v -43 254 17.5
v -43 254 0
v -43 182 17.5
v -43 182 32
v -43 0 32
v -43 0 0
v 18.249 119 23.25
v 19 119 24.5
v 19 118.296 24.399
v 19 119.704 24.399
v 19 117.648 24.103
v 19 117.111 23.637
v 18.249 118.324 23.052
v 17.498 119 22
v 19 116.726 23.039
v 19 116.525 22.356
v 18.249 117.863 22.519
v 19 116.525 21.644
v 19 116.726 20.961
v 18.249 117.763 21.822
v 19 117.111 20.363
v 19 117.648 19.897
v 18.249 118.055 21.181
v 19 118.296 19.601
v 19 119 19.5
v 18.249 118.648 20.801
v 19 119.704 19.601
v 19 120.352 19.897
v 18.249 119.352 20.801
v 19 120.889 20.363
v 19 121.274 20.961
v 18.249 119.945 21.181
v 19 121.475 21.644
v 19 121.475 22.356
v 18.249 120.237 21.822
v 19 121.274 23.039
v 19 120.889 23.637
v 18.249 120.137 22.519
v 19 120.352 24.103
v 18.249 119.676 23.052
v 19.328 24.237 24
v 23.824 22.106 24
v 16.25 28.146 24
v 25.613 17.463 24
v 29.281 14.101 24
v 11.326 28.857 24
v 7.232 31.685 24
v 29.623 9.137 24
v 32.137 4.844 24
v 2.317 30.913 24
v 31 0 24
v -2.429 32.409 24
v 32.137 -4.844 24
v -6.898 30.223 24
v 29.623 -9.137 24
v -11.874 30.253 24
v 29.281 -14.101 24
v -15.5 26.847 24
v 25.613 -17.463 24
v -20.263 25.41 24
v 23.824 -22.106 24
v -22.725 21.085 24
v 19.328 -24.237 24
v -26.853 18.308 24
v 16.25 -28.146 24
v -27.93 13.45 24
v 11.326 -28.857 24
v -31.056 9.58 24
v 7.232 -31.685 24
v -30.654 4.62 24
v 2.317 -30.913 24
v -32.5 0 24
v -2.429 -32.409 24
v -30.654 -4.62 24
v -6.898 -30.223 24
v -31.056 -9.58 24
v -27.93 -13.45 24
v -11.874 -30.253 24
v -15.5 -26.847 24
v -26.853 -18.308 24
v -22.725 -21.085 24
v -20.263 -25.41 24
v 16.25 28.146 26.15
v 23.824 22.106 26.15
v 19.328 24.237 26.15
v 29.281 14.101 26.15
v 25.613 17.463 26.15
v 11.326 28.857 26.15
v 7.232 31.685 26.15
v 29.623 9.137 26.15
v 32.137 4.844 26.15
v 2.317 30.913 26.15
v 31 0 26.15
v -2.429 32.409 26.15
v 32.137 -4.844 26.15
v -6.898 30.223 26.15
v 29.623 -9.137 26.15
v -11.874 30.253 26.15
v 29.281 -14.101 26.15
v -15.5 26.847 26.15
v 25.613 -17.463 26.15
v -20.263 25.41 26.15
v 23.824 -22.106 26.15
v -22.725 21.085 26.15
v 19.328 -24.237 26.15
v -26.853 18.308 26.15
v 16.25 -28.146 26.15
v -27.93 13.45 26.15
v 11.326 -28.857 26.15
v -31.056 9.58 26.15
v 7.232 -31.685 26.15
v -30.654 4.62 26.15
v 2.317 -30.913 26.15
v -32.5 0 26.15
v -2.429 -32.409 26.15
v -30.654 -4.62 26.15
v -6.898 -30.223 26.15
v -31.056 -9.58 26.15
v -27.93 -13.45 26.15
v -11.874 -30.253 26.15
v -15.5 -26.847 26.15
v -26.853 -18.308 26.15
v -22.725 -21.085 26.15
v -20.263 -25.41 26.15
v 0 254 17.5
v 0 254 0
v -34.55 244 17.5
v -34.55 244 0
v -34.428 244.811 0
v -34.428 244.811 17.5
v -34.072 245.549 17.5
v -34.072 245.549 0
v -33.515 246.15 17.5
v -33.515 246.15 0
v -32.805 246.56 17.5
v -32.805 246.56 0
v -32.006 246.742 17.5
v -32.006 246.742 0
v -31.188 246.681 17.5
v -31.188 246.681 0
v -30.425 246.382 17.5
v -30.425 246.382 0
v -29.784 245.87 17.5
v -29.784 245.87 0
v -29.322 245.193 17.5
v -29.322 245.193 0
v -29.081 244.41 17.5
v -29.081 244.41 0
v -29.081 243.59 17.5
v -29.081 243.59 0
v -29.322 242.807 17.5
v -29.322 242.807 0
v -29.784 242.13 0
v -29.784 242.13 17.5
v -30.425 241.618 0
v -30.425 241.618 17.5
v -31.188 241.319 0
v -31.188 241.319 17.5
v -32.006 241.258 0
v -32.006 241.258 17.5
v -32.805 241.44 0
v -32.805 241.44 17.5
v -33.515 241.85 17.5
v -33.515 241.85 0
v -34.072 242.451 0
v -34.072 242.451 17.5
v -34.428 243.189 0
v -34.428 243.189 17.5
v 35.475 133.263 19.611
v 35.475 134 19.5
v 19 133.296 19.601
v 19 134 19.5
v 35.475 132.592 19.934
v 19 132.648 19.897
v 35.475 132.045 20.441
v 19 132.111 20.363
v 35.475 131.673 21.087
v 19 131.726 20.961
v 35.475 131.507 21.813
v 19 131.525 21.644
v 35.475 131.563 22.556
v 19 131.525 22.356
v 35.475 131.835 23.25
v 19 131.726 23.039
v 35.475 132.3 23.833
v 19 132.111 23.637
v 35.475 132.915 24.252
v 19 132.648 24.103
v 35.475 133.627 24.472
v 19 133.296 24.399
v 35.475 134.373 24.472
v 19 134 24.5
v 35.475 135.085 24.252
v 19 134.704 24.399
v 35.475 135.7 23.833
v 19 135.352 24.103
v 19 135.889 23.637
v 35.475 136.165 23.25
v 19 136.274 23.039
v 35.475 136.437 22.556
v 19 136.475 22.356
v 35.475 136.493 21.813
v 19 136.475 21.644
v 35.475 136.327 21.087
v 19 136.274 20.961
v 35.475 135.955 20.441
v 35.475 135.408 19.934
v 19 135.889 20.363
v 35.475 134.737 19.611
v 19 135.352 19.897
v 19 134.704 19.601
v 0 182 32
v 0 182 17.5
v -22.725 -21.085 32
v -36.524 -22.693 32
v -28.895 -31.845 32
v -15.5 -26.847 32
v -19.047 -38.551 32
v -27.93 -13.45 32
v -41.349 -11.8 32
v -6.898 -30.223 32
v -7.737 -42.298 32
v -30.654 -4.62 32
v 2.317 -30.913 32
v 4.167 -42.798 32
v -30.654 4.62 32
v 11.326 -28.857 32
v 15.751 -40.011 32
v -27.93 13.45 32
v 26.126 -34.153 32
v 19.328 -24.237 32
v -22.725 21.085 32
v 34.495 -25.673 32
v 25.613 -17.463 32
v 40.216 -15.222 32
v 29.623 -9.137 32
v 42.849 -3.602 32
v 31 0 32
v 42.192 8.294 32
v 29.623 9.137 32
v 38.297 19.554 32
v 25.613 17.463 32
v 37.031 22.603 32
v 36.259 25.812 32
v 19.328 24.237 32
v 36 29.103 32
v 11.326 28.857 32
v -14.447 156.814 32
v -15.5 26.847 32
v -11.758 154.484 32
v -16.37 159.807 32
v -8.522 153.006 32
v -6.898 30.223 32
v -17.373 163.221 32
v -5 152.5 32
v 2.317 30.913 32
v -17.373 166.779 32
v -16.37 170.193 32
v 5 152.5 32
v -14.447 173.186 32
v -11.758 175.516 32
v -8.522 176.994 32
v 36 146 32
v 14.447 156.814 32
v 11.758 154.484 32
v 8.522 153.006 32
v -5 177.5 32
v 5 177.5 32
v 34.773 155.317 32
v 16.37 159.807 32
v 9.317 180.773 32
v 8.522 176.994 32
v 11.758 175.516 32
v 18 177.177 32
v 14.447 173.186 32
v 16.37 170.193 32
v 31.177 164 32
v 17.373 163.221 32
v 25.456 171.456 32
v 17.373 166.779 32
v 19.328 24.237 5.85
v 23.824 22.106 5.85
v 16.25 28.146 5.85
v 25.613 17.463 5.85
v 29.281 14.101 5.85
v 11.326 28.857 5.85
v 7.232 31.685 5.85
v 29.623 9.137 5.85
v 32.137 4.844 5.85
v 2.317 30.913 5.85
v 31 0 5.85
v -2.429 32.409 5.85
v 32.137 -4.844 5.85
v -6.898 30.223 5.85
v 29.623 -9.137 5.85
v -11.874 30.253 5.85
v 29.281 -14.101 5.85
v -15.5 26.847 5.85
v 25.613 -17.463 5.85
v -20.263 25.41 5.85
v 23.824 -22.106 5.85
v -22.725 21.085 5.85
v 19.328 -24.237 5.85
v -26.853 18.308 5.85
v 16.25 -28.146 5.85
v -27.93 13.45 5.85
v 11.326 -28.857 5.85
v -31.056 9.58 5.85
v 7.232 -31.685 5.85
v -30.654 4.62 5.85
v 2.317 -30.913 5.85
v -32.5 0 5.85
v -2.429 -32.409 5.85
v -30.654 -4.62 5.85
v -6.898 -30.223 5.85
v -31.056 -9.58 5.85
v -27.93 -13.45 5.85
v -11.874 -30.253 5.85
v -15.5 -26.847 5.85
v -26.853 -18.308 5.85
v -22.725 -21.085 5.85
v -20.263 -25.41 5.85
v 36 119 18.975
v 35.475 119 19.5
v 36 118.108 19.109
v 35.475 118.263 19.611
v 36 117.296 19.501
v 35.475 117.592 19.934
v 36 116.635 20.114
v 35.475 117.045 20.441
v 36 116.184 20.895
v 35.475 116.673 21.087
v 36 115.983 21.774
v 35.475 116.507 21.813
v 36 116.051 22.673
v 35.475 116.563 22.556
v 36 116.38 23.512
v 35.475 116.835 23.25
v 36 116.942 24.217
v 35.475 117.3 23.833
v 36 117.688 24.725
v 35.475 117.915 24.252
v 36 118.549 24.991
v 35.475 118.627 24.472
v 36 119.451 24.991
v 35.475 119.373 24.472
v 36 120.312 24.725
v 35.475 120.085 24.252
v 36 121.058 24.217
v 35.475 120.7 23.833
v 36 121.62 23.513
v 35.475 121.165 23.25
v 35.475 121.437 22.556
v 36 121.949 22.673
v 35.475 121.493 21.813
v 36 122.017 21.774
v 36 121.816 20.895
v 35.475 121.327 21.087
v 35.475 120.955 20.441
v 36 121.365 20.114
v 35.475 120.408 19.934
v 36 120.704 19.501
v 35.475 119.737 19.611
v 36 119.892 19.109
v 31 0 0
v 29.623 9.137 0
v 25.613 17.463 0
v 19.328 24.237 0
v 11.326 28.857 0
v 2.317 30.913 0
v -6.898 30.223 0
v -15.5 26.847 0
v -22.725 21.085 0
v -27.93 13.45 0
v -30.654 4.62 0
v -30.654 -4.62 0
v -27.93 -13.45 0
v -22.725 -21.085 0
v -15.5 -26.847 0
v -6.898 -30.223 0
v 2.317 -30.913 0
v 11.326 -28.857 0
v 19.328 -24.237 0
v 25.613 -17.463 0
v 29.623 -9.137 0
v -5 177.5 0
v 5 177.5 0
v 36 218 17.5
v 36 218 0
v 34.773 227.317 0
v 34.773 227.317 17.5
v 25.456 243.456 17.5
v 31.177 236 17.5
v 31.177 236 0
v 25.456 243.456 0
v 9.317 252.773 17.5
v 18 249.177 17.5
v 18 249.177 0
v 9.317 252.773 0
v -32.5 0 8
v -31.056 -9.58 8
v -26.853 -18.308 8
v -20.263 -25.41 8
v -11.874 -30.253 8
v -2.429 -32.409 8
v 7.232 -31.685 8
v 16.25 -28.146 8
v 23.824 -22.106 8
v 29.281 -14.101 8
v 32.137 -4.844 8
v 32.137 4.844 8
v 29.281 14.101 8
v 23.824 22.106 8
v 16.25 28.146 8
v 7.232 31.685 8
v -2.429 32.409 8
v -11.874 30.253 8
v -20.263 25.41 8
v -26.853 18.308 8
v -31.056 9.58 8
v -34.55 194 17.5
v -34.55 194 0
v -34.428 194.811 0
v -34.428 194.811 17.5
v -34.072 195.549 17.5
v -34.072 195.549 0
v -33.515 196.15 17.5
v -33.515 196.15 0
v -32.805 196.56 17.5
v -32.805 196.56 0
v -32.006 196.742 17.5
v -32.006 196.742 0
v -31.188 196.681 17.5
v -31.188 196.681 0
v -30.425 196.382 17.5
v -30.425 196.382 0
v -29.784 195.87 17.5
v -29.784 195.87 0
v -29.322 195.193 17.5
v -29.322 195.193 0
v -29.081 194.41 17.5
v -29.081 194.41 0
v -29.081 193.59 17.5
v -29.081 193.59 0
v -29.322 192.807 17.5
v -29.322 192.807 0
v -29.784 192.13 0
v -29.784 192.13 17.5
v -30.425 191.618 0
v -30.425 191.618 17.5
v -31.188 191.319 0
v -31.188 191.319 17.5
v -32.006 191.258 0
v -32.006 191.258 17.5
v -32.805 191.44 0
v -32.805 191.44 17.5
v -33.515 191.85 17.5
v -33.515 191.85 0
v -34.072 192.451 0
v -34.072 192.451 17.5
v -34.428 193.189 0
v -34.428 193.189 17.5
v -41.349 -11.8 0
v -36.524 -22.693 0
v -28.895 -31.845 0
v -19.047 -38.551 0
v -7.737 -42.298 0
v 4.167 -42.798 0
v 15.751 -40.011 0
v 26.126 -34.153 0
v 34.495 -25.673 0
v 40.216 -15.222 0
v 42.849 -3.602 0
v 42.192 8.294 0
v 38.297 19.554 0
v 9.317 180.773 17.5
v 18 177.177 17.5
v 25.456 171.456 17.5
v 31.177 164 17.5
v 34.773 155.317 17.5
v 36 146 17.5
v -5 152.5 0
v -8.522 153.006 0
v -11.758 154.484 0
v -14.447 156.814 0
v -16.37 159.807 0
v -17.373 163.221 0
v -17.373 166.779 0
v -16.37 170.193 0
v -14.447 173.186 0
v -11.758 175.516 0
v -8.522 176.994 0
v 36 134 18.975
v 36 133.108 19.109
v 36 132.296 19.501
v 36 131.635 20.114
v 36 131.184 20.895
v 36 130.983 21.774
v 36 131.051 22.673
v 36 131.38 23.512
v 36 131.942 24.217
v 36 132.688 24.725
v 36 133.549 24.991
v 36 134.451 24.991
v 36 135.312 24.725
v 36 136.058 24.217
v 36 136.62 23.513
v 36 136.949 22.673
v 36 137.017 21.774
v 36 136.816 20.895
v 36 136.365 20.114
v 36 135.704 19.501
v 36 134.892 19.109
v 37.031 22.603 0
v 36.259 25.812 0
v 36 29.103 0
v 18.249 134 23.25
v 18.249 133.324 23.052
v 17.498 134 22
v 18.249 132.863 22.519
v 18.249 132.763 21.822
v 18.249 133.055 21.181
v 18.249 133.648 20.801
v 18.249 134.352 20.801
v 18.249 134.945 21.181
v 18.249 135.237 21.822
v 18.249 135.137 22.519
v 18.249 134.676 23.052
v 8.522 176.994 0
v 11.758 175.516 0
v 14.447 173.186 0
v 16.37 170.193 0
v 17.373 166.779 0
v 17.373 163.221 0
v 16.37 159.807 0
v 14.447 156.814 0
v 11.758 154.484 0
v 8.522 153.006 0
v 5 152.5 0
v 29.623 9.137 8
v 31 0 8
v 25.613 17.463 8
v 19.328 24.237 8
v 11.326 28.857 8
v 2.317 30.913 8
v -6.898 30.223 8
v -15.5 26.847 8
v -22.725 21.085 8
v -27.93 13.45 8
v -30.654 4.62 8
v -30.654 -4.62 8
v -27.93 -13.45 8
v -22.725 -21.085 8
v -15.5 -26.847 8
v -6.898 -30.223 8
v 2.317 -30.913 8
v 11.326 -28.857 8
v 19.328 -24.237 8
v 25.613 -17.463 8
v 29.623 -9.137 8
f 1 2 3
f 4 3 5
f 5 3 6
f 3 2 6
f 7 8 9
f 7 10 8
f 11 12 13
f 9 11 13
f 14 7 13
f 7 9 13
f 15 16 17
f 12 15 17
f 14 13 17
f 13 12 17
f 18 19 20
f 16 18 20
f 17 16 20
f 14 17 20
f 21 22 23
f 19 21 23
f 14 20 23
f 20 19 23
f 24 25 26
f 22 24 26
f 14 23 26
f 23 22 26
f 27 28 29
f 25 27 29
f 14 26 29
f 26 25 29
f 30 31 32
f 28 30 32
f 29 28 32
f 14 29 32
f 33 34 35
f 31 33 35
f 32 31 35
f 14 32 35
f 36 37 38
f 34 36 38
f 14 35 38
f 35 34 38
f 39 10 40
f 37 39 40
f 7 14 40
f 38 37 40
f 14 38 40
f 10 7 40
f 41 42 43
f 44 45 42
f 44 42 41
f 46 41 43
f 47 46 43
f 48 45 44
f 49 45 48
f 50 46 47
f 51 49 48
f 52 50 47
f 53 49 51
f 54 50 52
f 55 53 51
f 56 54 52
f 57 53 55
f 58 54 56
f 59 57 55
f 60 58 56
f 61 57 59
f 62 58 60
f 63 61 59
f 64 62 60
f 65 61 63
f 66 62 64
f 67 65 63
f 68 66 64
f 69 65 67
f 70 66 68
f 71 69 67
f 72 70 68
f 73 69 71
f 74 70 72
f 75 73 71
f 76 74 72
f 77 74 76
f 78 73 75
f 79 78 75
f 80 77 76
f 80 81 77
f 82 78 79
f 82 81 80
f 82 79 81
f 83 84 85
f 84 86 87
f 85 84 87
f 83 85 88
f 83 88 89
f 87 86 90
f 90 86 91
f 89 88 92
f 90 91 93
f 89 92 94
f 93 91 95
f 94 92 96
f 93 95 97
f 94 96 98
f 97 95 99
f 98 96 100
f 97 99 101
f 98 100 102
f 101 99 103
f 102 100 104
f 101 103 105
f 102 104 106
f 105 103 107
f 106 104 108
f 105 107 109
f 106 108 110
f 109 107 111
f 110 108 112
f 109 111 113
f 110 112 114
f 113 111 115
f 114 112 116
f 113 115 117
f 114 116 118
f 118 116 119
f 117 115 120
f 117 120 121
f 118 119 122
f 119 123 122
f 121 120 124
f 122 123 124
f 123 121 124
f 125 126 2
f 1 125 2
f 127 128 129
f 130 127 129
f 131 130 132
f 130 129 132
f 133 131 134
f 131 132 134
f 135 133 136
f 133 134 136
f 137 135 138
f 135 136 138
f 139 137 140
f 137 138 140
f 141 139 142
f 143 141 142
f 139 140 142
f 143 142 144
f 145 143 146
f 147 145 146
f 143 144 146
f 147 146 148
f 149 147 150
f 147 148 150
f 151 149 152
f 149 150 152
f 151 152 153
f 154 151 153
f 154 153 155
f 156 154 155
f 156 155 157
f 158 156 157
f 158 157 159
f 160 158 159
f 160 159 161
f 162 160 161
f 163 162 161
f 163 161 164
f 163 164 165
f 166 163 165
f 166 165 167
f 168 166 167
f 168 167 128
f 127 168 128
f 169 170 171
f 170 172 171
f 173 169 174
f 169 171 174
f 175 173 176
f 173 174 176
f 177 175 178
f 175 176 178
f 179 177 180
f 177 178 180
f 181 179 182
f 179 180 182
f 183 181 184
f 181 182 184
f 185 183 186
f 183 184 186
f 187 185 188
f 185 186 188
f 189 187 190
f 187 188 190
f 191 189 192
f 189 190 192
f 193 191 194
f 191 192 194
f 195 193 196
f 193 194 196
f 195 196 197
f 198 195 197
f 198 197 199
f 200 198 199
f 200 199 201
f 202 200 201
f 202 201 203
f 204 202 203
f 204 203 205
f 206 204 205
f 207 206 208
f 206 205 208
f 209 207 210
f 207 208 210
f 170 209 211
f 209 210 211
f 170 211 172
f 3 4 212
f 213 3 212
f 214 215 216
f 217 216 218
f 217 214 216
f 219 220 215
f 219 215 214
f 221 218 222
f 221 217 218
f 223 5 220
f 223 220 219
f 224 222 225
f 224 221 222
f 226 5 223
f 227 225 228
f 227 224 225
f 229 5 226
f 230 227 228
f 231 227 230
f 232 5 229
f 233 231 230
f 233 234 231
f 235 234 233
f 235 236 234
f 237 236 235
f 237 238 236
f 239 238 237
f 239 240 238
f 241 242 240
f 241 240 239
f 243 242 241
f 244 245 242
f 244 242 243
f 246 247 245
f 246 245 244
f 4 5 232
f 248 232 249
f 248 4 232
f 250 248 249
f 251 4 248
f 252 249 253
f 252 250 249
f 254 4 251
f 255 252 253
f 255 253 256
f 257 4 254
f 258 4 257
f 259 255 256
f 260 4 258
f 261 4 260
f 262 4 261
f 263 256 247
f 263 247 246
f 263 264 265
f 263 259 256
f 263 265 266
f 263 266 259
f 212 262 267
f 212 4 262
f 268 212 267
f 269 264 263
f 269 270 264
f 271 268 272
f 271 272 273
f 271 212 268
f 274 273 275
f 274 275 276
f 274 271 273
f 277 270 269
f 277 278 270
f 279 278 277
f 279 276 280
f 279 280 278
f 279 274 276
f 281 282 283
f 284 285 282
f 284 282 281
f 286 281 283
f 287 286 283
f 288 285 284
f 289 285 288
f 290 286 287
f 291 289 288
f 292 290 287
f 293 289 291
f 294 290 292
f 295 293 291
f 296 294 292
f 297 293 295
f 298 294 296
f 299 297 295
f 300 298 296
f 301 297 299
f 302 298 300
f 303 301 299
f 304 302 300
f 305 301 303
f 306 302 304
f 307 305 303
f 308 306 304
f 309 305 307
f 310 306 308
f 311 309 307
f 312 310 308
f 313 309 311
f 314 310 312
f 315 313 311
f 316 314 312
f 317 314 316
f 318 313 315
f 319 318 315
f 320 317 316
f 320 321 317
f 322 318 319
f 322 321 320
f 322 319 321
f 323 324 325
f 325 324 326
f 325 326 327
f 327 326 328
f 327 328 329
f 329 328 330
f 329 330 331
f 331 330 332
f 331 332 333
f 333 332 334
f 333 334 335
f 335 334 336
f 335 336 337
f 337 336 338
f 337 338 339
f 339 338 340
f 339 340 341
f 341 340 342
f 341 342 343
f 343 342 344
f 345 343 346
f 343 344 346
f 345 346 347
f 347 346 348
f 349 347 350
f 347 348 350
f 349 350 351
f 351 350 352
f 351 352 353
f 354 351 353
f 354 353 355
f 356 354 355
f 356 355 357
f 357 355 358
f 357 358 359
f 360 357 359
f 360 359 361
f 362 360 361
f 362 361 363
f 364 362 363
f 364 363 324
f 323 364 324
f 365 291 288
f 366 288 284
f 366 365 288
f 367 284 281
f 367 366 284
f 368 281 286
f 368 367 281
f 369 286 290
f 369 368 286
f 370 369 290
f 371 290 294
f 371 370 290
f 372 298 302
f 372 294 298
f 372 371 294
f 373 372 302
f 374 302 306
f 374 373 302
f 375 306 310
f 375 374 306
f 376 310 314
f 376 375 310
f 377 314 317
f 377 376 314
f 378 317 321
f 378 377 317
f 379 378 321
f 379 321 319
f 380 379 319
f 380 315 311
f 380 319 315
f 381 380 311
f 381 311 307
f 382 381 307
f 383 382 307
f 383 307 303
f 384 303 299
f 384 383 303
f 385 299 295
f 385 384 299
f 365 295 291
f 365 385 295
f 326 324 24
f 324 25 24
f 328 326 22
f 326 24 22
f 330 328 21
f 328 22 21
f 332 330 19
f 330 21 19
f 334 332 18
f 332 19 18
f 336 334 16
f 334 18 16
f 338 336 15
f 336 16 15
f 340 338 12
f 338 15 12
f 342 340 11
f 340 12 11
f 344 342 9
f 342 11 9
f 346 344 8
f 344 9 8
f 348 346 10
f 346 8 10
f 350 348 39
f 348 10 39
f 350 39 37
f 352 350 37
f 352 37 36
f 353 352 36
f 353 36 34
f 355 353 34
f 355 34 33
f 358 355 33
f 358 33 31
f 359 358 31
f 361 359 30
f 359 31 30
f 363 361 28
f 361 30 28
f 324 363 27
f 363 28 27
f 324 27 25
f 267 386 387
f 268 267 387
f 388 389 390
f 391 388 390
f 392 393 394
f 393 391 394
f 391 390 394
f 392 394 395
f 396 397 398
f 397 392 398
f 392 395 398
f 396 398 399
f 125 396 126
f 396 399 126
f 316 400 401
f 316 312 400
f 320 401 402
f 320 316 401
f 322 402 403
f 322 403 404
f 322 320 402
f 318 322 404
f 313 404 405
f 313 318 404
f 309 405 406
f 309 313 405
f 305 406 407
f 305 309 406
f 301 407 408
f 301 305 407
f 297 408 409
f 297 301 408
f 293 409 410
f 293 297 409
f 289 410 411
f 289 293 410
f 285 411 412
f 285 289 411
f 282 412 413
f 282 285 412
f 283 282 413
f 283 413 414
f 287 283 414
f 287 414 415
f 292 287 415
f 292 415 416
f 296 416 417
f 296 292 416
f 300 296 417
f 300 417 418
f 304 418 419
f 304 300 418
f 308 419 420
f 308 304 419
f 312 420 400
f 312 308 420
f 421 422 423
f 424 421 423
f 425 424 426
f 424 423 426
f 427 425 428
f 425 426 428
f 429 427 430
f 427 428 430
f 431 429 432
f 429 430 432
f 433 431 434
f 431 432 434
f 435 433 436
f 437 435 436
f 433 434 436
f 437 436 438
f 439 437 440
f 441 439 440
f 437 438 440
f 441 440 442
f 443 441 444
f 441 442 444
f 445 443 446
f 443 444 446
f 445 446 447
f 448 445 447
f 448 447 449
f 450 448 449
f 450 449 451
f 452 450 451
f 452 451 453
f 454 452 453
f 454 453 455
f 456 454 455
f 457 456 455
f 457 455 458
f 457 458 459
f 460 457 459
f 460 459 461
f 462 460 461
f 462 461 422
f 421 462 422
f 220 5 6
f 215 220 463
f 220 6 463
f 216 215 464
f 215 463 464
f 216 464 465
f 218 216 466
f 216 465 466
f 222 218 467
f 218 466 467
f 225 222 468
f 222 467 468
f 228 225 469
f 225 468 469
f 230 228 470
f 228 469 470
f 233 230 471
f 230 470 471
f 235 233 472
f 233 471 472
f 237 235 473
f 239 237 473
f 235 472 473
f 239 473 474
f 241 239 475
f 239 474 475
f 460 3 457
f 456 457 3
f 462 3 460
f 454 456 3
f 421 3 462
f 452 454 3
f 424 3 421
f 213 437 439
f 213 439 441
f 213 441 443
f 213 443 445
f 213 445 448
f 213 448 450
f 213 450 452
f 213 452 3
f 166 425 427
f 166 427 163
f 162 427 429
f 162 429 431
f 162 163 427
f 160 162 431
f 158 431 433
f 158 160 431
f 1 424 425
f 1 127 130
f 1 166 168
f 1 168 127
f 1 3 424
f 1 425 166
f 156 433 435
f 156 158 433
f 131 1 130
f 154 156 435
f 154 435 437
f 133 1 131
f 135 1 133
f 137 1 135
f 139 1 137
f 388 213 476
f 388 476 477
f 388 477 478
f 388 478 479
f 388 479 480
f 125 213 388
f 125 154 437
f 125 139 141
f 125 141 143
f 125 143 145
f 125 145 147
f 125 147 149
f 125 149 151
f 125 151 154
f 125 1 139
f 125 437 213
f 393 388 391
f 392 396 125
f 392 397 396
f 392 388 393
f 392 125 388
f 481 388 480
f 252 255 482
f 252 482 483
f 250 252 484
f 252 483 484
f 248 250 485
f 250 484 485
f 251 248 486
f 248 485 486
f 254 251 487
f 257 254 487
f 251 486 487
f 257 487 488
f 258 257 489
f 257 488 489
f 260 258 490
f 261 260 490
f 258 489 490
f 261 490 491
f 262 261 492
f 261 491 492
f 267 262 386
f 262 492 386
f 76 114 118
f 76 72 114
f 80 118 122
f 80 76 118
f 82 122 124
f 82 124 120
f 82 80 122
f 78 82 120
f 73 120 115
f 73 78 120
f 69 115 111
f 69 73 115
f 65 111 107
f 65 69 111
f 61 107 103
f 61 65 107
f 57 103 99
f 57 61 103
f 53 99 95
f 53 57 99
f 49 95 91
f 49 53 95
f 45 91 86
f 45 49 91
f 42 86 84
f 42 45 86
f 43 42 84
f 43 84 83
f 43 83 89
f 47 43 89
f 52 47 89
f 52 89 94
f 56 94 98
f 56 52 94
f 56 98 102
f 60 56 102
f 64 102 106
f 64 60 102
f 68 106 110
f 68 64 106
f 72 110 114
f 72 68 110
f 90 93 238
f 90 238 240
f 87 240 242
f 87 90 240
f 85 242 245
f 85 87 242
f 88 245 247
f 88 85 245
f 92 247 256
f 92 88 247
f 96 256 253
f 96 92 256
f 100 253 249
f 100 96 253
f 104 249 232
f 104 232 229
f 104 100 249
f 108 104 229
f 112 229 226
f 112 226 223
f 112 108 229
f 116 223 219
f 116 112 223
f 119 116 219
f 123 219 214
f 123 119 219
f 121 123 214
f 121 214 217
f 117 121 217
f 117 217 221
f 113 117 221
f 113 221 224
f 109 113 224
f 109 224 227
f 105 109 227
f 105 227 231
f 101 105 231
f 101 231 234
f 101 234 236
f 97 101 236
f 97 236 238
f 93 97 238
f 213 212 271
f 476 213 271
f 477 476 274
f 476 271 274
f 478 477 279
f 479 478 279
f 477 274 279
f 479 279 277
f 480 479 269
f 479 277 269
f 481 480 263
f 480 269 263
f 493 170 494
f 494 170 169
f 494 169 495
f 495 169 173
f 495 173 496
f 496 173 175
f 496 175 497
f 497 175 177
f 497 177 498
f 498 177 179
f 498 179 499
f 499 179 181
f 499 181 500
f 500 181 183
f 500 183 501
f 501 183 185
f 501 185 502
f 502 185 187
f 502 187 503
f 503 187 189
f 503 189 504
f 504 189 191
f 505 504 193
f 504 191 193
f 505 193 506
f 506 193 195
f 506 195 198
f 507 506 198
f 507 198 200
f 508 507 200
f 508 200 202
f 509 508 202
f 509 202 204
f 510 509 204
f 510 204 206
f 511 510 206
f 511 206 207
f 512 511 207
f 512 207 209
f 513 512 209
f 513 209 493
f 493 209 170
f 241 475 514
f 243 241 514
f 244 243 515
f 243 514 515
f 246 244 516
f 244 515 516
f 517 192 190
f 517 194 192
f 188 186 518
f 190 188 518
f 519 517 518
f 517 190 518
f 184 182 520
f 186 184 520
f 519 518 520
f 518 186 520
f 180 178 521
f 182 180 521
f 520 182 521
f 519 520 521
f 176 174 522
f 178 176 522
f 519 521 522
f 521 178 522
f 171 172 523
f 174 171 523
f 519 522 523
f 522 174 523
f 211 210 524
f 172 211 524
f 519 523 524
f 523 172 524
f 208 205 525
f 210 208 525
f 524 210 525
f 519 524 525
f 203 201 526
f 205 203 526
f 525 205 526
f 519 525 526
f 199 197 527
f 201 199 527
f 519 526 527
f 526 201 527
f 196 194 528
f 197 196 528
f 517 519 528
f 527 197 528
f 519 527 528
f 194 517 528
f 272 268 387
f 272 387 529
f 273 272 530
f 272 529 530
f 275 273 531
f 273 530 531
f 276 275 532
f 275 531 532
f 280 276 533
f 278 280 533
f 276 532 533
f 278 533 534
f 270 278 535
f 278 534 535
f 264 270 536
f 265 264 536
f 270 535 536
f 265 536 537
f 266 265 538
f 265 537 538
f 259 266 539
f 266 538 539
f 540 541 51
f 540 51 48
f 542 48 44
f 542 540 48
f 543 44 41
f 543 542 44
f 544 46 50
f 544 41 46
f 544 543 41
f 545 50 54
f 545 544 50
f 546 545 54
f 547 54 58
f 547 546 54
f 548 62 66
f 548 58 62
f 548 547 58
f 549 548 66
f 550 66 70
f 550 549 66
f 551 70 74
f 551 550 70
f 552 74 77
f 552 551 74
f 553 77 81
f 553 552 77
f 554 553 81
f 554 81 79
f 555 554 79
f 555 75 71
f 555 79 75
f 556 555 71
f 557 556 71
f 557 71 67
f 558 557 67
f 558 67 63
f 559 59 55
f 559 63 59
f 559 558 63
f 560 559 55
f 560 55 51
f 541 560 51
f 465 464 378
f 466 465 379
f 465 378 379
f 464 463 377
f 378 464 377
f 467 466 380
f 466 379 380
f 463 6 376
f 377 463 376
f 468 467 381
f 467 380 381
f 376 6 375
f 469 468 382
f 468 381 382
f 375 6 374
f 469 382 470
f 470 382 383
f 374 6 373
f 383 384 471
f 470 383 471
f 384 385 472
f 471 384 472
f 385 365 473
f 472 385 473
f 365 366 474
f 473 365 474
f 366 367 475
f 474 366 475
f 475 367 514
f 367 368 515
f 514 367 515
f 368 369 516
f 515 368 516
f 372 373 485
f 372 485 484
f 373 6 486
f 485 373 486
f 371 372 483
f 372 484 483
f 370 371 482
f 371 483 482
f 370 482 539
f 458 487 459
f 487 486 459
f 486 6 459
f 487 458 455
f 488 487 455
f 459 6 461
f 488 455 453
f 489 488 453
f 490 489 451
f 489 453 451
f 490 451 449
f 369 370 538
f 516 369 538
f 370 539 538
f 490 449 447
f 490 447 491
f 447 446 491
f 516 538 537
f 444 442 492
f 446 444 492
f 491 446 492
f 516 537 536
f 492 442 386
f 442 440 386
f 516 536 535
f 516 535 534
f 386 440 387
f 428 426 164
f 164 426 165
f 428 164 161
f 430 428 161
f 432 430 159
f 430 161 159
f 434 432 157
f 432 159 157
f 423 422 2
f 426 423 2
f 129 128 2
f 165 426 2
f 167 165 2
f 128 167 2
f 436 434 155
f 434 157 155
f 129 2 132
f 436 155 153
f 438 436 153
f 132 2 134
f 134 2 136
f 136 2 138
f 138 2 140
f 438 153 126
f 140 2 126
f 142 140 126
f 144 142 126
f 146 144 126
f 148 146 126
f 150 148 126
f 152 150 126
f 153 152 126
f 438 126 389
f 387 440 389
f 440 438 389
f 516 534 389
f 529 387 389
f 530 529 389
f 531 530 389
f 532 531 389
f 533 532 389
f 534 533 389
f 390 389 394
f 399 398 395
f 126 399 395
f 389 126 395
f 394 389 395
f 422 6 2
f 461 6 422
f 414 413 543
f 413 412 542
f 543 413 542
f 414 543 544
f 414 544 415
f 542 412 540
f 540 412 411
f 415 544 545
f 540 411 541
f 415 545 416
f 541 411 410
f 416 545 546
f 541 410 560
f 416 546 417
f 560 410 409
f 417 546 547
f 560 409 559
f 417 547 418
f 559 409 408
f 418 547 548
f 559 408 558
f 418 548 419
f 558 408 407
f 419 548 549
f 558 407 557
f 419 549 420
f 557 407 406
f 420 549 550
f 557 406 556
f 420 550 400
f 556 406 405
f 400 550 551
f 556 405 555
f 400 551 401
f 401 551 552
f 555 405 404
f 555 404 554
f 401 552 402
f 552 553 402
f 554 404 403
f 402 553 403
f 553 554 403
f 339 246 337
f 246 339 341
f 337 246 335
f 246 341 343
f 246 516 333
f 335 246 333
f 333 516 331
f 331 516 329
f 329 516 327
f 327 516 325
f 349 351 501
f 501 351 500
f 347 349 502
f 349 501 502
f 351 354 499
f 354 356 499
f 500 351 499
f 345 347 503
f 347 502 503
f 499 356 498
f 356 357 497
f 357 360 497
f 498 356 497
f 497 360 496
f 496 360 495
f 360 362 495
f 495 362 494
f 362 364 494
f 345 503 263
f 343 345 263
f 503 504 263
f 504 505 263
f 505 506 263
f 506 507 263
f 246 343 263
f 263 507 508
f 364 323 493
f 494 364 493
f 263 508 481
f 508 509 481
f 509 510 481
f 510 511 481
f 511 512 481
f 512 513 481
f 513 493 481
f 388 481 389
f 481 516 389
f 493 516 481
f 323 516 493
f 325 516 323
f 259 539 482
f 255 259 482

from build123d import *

# Parameters (mm, degrees)
SKIZZE1_R                        = 31
AUFSATZ_LINEAR_AUSTRAGEN1_DEPTH  = 32
SKIZZE2_W                        = 2.5
SKIZZE2_H                        = 2.15
SCHNITT_LINEAR_AUSTRAGEN1_DEPTH  = 14.5
F_5_5_5_5_DURCHMESSER_BOHRUNG1_D = 5.5
M6_GEWINDEBOHRUNG1_D             = 5
M6_GEWINDEBOHRUNG1_DEPTH         = 17
M6_GEWINDEBOHRUNG1_CSINK_D       = 6.05
M6_GEWINDEBOHRUNG1_CSINK_ANGLE   = 90
M6_GEWINDEBOHRUNG1_TIP           = 1.502151548


with BuildPart() as part:
    # Skizze1 → Aufsatz-Linear austragen1 (new body)
    with BuildSketch(Plane.XY):
        with BuildLine():
            Line((36, 29.103264422), (36, 218))
            ThreePointArc((36, 218), (25.455844123, 243.455844123), (0, 254))
            Line((0, 254), (-43, 254))
            Line((-43, 254), (-43, 0))
            ThreePointArc((-43, 0), (10.055704227, -41.807688438), (38.296875, 19.553755783))
            ThreePointArc((38.296875, 19.553755783), (36.582291693, 24.192339102), (36, 29.103264422))
        make_face()
        Circle(SKIZZE1_R, mode=Mode.SUBTRACT)
        with BuildLine():
            Line((5, 152.5), (-5, 152.5))
            ThreePointArc((-5, 152.5), (-17.5, 165), (-5, 177.5))
            Line((-5, 177.5), (5, 177.5))
            ThreePointArc((5, 177.5), (17.5, 165), (5, 152.5))
        make_face(mode=Mode.SUBTRACT)
    extrude(amount=AUFSATZ_LINEAR_AUSTRAGEN1_DEPTH)

    # Skizze2 → Schnitt-Rotation1 (revolve, cut)
    with BuildSketch(Plane(origin=(0, 0, 0), x_dir=(1, 0, 0), z_dir=(0, 1, 0))):
        with Locations((-31.25, -6.925)):
            Rectangle(SKIZZE2_W, SKIZZE2_H)
        with Locations((-31.25, -25.075)):
            Rectangle(SKIZZE2_W, SKIZZE2_H)
    revolve(axis=Axis((0, 0, 0), (0, 0, 1)), mode=Mode.SUBTRACT)

    # Skizze3 → Schnitt-Linear austragen1 (cut)
    with BuildSketch(Plane.XY.offset(32)):
        with BuildLine():
            Line((-43, 182), (0, 182))
            ThreePointArc((0, 182), (25.455844123, 171.455844123), (36, 146))
            Line((36, 146), (92.796616339, 146))
            Line((92.796616339, 146), (92.796616339, 301.382333193))
            Line((92.796616339, 301.382333193), (-43, 301.382333193))
            Line((-43, 301.382333193), (-43, 182))
        make_face()
    extrude(amount=-SCHNITT_LINEAR_AUSTRAGEN1_DEPTH, mode=Mode.SUBTRACT)

    # Ø5.5 (5.5) Durchmesser Bohrung1 (through all)
    with Locations(Plane.XY.offset(17.5)):
        with Locations((-31.8, 194), (-31.8, 244)):
            Hole(F_5_5_5_5_DURCHMESSER_BOHRUNG1_D / 2)

    # M6 Gewindebohrung1
    with Locations(Plane(origin=(36, 0, -4), x_dir=(0, 0, 1), z_dir=(1, 0, 0))):
        with Locations((26, -134), (26, -119)):
            CounterSinkHole(M6_GEWINDEBOHRUNG1_D / 2, M6_GEWINDEBOHRUNG1_CSINK_D / 2, depth=M6_GEWINDEBOHRUNG1_DEPTH, counter_sink_angle=M6_GEWINDEBOHRUNG1_CSINK_ANGLE)
            with Locations((0, 0, -(M6_GEWINDEBOHRUNG1_DEPTH + M6_GEWINDEBOHRUNG1_TIP / 2))):  # 118° drill point
                Cone(0, M6_GEWINDEBOHRUNG1_D / 2, M6_GEWINDEBOHRUNG1_TIP, mode=Mode.SUBTRACT)


solid = part.part
